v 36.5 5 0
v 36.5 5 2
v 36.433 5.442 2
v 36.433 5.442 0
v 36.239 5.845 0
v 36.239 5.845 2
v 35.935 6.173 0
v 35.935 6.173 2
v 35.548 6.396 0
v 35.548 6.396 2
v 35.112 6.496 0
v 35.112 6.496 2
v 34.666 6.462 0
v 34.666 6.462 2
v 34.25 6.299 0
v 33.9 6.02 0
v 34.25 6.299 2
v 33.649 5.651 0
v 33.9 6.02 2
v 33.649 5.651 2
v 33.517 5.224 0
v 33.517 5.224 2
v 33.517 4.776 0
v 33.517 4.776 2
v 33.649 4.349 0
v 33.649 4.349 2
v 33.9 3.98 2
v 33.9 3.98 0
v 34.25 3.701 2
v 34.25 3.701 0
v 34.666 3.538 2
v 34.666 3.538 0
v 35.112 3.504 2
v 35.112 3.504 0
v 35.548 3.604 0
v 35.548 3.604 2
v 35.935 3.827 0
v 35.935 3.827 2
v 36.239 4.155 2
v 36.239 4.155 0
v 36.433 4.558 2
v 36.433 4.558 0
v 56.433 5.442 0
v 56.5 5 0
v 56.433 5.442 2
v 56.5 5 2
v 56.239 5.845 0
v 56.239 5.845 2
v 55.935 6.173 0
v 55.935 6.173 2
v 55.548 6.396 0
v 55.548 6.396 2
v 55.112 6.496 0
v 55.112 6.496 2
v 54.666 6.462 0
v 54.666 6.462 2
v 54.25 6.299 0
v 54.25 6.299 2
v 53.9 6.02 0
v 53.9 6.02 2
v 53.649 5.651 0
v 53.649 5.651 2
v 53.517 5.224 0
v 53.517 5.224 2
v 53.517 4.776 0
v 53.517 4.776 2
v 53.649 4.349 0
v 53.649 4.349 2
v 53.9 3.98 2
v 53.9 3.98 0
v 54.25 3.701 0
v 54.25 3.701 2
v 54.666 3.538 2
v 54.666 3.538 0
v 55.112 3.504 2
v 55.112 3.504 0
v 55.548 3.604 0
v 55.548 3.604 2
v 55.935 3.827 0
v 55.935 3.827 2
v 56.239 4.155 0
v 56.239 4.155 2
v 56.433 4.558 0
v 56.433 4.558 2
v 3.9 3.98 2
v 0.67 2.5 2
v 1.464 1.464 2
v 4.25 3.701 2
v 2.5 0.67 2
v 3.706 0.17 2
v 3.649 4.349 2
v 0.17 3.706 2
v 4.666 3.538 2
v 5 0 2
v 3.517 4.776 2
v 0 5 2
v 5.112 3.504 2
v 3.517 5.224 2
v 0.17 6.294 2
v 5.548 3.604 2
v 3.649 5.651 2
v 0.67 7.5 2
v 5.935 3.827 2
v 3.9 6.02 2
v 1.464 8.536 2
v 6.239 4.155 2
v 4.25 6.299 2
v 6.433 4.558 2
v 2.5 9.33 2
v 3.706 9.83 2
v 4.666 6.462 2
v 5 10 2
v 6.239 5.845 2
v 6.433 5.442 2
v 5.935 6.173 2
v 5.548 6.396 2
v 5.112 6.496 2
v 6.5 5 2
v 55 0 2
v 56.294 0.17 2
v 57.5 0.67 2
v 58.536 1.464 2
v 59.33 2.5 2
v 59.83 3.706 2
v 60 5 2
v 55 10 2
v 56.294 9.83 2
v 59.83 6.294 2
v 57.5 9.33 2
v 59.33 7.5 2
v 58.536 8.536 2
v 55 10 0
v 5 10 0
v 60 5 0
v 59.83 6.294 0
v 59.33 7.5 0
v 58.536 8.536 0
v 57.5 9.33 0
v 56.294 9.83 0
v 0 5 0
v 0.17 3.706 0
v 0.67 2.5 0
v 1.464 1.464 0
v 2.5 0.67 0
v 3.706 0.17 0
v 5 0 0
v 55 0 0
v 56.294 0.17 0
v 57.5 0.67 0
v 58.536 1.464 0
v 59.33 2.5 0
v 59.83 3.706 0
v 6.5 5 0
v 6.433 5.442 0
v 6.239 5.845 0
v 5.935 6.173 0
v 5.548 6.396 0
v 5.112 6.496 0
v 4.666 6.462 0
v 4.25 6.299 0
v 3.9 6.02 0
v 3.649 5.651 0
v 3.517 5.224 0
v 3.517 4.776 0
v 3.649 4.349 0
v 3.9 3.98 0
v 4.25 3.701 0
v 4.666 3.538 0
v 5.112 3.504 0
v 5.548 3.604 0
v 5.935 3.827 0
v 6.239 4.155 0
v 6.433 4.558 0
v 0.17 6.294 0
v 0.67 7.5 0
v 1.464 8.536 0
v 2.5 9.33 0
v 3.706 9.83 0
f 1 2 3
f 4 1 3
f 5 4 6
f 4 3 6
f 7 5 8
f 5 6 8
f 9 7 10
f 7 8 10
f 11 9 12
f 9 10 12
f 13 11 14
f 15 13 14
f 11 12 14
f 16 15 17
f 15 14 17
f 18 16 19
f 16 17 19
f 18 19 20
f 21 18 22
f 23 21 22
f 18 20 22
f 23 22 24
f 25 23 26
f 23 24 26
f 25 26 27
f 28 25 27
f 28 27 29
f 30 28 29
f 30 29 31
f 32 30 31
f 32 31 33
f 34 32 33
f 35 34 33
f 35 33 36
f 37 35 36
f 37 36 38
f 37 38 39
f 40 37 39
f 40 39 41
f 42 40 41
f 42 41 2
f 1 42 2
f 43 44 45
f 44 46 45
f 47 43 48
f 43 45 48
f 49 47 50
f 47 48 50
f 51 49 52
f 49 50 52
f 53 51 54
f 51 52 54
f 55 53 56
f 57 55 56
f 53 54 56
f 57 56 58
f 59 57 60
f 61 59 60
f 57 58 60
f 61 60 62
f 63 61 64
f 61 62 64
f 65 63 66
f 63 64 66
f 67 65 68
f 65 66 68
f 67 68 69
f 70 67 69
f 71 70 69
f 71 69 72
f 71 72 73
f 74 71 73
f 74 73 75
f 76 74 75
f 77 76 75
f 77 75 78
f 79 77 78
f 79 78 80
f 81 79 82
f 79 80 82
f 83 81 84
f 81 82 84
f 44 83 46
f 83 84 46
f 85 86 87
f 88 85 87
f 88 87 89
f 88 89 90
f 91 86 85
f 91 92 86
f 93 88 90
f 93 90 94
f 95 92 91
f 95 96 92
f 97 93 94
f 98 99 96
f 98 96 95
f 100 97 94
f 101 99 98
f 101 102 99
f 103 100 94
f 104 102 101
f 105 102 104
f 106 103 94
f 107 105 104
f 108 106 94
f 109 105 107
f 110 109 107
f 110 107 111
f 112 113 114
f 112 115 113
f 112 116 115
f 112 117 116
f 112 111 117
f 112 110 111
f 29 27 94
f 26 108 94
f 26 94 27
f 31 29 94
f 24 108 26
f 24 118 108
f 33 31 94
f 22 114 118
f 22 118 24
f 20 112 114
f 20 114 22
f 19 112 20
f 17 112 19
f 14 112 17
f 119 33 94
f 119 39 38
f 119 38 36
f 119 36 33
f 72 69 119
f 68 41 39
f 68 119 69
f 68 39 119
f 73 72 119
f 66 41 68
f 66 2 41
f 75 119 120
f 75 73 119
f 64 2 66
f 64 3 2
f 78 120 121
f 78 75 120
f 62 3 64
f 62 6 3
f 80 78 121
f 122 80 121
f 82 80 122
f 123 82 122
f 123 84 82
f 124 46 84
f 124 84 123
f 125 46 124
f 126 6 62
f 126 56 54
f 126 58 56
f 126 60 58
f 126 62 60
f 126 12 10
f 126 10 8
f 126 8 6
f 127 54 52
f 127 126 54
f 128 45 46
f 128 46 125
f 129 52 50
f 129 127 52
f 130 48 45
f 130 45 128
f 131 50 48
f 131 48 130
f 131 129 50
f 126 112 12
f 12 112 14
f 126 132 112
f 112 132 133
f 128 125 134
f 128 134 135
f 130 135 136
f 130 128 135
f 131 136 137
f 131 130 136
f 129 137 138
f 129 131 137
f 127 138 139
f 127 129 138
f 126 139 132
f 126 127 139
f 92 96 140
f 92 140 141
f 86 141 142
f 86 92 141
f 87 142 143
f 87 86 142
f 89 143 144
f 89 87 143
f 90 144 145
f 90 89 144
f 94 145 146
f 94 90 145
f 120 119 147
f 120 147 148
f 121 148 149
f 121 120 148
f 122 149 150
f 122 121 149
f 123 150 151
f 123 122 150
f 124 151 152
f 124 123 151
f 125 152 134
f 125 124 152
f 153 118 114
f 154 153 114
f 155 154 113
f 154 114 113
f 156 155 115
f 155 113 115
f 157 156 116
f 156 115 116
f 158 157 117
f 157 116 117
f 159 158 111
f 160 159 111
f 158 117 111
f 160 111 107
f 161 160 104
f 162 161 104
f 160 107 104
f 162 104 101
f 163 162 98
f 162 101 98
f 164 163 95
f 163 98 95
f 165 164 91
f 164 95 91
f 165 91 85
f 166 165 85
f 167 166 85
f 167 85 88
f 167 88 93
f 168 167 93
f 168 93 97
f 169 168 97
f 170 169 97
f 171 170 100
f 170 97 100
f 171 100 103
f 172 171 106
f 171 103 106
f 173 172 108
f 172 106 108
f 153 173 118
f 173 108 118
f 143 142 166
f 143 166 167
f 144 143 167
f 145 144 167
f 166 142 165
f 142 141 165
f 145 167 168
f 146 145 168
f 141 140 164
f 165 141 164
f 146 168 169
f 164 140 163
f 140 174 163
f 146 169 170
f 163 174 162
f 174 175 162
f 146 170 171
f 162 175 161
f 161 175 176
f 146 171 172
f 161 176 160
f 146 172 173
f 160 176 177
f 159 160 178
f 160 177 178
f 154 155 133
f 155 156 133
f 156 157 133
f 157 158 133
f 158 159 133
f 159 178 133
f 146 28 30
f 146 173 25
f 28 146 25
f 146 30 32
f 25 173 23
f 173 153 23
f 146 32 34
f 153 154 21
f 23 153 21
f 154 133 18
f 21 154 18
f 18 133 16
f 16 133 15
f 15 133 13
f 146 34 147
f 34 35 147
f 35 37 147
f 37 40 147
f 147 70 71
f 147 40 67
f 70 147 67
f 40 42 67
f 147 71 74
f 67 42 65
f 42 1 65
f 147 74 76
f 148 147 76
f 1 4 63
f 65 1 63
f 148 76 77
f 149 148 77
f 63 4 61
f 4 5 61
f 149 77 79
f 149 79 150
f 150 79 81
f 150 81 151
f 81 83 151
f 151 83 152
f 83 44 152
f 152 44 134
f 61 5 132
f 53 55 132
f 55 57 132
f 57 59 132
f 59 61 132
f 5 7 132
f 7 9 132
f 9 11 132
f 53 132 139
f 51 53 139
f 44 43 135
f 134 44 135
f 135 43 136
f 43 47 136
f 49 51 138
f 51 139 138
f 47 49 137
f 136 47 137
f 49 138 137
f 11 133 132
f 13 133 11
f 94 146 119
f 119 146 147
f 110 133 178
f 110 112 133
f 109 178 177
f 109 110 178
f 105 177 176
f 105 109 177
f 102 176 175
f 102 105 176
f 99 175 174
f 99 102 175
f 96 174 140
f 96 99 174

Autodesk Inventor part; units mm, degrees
ref_plane "YZ Plane" through (0, 0, 0) normal (1, 0, 0) x (0, 1, 0)
ref_plane "XZ Plane" through (0, 0, 0) normal (0, 1, 0) x (-1, 0, 0)
ref_plane "XY Plane" through (0, 0, 0) normal (0, 0, 1) x (1, 0, 0)
sketch "Sketch1" plane through (0, 0, 0) normal (0, 0, 1) x (1, 0, 0)
  line L0 (0, 0) -> (60, 0)
  line L1 (60, 0) -> (60, 10)
  line L2 (60, 10) -> (0, 10)
  line L3 (0, 10) -> (0, 0)
  dimension "d0" = 60
  dimension "d1" = 10
extrude "Extrusion1" add sketch "Sketch1" along normal blind 2
fillet "Fillet1" radius 5 4 edges at (0, 10, 1) (0, 0, 1) (60, 10, 1) (60, 0, 1)
sketch "Sketch2" plane through (0, 0, 2) normal (0, 0, 1) x (1, 0, 0)
  arc A0 (5, 10) -> (5, 0) centre (5, 5) ccw projected
  circle A1 centre (5, 5) radius 1.5
  arc A2 (55, 0) -> (55, 10) centre (55, 5) ccw projected
  circle A3 centre (55, 5) radius 1.5
  line L0 (55, 10) -> (5, 10) projected
  line L1 (30, 10) -> (30, 5)
  line L2 (30, 5) -> (35, 5)
  circle A4 centre (35, 5) radius 1.5
  point P0 (0, 0)
  dimension "d5" = 3
  dimension "d6" = 3
  dimension "d9" = 5
  dimension "d10" = 3
extrude "Extrusion2" cut sketch "Sketch2" against normal blind 2
properties part number "Side Support 2"
